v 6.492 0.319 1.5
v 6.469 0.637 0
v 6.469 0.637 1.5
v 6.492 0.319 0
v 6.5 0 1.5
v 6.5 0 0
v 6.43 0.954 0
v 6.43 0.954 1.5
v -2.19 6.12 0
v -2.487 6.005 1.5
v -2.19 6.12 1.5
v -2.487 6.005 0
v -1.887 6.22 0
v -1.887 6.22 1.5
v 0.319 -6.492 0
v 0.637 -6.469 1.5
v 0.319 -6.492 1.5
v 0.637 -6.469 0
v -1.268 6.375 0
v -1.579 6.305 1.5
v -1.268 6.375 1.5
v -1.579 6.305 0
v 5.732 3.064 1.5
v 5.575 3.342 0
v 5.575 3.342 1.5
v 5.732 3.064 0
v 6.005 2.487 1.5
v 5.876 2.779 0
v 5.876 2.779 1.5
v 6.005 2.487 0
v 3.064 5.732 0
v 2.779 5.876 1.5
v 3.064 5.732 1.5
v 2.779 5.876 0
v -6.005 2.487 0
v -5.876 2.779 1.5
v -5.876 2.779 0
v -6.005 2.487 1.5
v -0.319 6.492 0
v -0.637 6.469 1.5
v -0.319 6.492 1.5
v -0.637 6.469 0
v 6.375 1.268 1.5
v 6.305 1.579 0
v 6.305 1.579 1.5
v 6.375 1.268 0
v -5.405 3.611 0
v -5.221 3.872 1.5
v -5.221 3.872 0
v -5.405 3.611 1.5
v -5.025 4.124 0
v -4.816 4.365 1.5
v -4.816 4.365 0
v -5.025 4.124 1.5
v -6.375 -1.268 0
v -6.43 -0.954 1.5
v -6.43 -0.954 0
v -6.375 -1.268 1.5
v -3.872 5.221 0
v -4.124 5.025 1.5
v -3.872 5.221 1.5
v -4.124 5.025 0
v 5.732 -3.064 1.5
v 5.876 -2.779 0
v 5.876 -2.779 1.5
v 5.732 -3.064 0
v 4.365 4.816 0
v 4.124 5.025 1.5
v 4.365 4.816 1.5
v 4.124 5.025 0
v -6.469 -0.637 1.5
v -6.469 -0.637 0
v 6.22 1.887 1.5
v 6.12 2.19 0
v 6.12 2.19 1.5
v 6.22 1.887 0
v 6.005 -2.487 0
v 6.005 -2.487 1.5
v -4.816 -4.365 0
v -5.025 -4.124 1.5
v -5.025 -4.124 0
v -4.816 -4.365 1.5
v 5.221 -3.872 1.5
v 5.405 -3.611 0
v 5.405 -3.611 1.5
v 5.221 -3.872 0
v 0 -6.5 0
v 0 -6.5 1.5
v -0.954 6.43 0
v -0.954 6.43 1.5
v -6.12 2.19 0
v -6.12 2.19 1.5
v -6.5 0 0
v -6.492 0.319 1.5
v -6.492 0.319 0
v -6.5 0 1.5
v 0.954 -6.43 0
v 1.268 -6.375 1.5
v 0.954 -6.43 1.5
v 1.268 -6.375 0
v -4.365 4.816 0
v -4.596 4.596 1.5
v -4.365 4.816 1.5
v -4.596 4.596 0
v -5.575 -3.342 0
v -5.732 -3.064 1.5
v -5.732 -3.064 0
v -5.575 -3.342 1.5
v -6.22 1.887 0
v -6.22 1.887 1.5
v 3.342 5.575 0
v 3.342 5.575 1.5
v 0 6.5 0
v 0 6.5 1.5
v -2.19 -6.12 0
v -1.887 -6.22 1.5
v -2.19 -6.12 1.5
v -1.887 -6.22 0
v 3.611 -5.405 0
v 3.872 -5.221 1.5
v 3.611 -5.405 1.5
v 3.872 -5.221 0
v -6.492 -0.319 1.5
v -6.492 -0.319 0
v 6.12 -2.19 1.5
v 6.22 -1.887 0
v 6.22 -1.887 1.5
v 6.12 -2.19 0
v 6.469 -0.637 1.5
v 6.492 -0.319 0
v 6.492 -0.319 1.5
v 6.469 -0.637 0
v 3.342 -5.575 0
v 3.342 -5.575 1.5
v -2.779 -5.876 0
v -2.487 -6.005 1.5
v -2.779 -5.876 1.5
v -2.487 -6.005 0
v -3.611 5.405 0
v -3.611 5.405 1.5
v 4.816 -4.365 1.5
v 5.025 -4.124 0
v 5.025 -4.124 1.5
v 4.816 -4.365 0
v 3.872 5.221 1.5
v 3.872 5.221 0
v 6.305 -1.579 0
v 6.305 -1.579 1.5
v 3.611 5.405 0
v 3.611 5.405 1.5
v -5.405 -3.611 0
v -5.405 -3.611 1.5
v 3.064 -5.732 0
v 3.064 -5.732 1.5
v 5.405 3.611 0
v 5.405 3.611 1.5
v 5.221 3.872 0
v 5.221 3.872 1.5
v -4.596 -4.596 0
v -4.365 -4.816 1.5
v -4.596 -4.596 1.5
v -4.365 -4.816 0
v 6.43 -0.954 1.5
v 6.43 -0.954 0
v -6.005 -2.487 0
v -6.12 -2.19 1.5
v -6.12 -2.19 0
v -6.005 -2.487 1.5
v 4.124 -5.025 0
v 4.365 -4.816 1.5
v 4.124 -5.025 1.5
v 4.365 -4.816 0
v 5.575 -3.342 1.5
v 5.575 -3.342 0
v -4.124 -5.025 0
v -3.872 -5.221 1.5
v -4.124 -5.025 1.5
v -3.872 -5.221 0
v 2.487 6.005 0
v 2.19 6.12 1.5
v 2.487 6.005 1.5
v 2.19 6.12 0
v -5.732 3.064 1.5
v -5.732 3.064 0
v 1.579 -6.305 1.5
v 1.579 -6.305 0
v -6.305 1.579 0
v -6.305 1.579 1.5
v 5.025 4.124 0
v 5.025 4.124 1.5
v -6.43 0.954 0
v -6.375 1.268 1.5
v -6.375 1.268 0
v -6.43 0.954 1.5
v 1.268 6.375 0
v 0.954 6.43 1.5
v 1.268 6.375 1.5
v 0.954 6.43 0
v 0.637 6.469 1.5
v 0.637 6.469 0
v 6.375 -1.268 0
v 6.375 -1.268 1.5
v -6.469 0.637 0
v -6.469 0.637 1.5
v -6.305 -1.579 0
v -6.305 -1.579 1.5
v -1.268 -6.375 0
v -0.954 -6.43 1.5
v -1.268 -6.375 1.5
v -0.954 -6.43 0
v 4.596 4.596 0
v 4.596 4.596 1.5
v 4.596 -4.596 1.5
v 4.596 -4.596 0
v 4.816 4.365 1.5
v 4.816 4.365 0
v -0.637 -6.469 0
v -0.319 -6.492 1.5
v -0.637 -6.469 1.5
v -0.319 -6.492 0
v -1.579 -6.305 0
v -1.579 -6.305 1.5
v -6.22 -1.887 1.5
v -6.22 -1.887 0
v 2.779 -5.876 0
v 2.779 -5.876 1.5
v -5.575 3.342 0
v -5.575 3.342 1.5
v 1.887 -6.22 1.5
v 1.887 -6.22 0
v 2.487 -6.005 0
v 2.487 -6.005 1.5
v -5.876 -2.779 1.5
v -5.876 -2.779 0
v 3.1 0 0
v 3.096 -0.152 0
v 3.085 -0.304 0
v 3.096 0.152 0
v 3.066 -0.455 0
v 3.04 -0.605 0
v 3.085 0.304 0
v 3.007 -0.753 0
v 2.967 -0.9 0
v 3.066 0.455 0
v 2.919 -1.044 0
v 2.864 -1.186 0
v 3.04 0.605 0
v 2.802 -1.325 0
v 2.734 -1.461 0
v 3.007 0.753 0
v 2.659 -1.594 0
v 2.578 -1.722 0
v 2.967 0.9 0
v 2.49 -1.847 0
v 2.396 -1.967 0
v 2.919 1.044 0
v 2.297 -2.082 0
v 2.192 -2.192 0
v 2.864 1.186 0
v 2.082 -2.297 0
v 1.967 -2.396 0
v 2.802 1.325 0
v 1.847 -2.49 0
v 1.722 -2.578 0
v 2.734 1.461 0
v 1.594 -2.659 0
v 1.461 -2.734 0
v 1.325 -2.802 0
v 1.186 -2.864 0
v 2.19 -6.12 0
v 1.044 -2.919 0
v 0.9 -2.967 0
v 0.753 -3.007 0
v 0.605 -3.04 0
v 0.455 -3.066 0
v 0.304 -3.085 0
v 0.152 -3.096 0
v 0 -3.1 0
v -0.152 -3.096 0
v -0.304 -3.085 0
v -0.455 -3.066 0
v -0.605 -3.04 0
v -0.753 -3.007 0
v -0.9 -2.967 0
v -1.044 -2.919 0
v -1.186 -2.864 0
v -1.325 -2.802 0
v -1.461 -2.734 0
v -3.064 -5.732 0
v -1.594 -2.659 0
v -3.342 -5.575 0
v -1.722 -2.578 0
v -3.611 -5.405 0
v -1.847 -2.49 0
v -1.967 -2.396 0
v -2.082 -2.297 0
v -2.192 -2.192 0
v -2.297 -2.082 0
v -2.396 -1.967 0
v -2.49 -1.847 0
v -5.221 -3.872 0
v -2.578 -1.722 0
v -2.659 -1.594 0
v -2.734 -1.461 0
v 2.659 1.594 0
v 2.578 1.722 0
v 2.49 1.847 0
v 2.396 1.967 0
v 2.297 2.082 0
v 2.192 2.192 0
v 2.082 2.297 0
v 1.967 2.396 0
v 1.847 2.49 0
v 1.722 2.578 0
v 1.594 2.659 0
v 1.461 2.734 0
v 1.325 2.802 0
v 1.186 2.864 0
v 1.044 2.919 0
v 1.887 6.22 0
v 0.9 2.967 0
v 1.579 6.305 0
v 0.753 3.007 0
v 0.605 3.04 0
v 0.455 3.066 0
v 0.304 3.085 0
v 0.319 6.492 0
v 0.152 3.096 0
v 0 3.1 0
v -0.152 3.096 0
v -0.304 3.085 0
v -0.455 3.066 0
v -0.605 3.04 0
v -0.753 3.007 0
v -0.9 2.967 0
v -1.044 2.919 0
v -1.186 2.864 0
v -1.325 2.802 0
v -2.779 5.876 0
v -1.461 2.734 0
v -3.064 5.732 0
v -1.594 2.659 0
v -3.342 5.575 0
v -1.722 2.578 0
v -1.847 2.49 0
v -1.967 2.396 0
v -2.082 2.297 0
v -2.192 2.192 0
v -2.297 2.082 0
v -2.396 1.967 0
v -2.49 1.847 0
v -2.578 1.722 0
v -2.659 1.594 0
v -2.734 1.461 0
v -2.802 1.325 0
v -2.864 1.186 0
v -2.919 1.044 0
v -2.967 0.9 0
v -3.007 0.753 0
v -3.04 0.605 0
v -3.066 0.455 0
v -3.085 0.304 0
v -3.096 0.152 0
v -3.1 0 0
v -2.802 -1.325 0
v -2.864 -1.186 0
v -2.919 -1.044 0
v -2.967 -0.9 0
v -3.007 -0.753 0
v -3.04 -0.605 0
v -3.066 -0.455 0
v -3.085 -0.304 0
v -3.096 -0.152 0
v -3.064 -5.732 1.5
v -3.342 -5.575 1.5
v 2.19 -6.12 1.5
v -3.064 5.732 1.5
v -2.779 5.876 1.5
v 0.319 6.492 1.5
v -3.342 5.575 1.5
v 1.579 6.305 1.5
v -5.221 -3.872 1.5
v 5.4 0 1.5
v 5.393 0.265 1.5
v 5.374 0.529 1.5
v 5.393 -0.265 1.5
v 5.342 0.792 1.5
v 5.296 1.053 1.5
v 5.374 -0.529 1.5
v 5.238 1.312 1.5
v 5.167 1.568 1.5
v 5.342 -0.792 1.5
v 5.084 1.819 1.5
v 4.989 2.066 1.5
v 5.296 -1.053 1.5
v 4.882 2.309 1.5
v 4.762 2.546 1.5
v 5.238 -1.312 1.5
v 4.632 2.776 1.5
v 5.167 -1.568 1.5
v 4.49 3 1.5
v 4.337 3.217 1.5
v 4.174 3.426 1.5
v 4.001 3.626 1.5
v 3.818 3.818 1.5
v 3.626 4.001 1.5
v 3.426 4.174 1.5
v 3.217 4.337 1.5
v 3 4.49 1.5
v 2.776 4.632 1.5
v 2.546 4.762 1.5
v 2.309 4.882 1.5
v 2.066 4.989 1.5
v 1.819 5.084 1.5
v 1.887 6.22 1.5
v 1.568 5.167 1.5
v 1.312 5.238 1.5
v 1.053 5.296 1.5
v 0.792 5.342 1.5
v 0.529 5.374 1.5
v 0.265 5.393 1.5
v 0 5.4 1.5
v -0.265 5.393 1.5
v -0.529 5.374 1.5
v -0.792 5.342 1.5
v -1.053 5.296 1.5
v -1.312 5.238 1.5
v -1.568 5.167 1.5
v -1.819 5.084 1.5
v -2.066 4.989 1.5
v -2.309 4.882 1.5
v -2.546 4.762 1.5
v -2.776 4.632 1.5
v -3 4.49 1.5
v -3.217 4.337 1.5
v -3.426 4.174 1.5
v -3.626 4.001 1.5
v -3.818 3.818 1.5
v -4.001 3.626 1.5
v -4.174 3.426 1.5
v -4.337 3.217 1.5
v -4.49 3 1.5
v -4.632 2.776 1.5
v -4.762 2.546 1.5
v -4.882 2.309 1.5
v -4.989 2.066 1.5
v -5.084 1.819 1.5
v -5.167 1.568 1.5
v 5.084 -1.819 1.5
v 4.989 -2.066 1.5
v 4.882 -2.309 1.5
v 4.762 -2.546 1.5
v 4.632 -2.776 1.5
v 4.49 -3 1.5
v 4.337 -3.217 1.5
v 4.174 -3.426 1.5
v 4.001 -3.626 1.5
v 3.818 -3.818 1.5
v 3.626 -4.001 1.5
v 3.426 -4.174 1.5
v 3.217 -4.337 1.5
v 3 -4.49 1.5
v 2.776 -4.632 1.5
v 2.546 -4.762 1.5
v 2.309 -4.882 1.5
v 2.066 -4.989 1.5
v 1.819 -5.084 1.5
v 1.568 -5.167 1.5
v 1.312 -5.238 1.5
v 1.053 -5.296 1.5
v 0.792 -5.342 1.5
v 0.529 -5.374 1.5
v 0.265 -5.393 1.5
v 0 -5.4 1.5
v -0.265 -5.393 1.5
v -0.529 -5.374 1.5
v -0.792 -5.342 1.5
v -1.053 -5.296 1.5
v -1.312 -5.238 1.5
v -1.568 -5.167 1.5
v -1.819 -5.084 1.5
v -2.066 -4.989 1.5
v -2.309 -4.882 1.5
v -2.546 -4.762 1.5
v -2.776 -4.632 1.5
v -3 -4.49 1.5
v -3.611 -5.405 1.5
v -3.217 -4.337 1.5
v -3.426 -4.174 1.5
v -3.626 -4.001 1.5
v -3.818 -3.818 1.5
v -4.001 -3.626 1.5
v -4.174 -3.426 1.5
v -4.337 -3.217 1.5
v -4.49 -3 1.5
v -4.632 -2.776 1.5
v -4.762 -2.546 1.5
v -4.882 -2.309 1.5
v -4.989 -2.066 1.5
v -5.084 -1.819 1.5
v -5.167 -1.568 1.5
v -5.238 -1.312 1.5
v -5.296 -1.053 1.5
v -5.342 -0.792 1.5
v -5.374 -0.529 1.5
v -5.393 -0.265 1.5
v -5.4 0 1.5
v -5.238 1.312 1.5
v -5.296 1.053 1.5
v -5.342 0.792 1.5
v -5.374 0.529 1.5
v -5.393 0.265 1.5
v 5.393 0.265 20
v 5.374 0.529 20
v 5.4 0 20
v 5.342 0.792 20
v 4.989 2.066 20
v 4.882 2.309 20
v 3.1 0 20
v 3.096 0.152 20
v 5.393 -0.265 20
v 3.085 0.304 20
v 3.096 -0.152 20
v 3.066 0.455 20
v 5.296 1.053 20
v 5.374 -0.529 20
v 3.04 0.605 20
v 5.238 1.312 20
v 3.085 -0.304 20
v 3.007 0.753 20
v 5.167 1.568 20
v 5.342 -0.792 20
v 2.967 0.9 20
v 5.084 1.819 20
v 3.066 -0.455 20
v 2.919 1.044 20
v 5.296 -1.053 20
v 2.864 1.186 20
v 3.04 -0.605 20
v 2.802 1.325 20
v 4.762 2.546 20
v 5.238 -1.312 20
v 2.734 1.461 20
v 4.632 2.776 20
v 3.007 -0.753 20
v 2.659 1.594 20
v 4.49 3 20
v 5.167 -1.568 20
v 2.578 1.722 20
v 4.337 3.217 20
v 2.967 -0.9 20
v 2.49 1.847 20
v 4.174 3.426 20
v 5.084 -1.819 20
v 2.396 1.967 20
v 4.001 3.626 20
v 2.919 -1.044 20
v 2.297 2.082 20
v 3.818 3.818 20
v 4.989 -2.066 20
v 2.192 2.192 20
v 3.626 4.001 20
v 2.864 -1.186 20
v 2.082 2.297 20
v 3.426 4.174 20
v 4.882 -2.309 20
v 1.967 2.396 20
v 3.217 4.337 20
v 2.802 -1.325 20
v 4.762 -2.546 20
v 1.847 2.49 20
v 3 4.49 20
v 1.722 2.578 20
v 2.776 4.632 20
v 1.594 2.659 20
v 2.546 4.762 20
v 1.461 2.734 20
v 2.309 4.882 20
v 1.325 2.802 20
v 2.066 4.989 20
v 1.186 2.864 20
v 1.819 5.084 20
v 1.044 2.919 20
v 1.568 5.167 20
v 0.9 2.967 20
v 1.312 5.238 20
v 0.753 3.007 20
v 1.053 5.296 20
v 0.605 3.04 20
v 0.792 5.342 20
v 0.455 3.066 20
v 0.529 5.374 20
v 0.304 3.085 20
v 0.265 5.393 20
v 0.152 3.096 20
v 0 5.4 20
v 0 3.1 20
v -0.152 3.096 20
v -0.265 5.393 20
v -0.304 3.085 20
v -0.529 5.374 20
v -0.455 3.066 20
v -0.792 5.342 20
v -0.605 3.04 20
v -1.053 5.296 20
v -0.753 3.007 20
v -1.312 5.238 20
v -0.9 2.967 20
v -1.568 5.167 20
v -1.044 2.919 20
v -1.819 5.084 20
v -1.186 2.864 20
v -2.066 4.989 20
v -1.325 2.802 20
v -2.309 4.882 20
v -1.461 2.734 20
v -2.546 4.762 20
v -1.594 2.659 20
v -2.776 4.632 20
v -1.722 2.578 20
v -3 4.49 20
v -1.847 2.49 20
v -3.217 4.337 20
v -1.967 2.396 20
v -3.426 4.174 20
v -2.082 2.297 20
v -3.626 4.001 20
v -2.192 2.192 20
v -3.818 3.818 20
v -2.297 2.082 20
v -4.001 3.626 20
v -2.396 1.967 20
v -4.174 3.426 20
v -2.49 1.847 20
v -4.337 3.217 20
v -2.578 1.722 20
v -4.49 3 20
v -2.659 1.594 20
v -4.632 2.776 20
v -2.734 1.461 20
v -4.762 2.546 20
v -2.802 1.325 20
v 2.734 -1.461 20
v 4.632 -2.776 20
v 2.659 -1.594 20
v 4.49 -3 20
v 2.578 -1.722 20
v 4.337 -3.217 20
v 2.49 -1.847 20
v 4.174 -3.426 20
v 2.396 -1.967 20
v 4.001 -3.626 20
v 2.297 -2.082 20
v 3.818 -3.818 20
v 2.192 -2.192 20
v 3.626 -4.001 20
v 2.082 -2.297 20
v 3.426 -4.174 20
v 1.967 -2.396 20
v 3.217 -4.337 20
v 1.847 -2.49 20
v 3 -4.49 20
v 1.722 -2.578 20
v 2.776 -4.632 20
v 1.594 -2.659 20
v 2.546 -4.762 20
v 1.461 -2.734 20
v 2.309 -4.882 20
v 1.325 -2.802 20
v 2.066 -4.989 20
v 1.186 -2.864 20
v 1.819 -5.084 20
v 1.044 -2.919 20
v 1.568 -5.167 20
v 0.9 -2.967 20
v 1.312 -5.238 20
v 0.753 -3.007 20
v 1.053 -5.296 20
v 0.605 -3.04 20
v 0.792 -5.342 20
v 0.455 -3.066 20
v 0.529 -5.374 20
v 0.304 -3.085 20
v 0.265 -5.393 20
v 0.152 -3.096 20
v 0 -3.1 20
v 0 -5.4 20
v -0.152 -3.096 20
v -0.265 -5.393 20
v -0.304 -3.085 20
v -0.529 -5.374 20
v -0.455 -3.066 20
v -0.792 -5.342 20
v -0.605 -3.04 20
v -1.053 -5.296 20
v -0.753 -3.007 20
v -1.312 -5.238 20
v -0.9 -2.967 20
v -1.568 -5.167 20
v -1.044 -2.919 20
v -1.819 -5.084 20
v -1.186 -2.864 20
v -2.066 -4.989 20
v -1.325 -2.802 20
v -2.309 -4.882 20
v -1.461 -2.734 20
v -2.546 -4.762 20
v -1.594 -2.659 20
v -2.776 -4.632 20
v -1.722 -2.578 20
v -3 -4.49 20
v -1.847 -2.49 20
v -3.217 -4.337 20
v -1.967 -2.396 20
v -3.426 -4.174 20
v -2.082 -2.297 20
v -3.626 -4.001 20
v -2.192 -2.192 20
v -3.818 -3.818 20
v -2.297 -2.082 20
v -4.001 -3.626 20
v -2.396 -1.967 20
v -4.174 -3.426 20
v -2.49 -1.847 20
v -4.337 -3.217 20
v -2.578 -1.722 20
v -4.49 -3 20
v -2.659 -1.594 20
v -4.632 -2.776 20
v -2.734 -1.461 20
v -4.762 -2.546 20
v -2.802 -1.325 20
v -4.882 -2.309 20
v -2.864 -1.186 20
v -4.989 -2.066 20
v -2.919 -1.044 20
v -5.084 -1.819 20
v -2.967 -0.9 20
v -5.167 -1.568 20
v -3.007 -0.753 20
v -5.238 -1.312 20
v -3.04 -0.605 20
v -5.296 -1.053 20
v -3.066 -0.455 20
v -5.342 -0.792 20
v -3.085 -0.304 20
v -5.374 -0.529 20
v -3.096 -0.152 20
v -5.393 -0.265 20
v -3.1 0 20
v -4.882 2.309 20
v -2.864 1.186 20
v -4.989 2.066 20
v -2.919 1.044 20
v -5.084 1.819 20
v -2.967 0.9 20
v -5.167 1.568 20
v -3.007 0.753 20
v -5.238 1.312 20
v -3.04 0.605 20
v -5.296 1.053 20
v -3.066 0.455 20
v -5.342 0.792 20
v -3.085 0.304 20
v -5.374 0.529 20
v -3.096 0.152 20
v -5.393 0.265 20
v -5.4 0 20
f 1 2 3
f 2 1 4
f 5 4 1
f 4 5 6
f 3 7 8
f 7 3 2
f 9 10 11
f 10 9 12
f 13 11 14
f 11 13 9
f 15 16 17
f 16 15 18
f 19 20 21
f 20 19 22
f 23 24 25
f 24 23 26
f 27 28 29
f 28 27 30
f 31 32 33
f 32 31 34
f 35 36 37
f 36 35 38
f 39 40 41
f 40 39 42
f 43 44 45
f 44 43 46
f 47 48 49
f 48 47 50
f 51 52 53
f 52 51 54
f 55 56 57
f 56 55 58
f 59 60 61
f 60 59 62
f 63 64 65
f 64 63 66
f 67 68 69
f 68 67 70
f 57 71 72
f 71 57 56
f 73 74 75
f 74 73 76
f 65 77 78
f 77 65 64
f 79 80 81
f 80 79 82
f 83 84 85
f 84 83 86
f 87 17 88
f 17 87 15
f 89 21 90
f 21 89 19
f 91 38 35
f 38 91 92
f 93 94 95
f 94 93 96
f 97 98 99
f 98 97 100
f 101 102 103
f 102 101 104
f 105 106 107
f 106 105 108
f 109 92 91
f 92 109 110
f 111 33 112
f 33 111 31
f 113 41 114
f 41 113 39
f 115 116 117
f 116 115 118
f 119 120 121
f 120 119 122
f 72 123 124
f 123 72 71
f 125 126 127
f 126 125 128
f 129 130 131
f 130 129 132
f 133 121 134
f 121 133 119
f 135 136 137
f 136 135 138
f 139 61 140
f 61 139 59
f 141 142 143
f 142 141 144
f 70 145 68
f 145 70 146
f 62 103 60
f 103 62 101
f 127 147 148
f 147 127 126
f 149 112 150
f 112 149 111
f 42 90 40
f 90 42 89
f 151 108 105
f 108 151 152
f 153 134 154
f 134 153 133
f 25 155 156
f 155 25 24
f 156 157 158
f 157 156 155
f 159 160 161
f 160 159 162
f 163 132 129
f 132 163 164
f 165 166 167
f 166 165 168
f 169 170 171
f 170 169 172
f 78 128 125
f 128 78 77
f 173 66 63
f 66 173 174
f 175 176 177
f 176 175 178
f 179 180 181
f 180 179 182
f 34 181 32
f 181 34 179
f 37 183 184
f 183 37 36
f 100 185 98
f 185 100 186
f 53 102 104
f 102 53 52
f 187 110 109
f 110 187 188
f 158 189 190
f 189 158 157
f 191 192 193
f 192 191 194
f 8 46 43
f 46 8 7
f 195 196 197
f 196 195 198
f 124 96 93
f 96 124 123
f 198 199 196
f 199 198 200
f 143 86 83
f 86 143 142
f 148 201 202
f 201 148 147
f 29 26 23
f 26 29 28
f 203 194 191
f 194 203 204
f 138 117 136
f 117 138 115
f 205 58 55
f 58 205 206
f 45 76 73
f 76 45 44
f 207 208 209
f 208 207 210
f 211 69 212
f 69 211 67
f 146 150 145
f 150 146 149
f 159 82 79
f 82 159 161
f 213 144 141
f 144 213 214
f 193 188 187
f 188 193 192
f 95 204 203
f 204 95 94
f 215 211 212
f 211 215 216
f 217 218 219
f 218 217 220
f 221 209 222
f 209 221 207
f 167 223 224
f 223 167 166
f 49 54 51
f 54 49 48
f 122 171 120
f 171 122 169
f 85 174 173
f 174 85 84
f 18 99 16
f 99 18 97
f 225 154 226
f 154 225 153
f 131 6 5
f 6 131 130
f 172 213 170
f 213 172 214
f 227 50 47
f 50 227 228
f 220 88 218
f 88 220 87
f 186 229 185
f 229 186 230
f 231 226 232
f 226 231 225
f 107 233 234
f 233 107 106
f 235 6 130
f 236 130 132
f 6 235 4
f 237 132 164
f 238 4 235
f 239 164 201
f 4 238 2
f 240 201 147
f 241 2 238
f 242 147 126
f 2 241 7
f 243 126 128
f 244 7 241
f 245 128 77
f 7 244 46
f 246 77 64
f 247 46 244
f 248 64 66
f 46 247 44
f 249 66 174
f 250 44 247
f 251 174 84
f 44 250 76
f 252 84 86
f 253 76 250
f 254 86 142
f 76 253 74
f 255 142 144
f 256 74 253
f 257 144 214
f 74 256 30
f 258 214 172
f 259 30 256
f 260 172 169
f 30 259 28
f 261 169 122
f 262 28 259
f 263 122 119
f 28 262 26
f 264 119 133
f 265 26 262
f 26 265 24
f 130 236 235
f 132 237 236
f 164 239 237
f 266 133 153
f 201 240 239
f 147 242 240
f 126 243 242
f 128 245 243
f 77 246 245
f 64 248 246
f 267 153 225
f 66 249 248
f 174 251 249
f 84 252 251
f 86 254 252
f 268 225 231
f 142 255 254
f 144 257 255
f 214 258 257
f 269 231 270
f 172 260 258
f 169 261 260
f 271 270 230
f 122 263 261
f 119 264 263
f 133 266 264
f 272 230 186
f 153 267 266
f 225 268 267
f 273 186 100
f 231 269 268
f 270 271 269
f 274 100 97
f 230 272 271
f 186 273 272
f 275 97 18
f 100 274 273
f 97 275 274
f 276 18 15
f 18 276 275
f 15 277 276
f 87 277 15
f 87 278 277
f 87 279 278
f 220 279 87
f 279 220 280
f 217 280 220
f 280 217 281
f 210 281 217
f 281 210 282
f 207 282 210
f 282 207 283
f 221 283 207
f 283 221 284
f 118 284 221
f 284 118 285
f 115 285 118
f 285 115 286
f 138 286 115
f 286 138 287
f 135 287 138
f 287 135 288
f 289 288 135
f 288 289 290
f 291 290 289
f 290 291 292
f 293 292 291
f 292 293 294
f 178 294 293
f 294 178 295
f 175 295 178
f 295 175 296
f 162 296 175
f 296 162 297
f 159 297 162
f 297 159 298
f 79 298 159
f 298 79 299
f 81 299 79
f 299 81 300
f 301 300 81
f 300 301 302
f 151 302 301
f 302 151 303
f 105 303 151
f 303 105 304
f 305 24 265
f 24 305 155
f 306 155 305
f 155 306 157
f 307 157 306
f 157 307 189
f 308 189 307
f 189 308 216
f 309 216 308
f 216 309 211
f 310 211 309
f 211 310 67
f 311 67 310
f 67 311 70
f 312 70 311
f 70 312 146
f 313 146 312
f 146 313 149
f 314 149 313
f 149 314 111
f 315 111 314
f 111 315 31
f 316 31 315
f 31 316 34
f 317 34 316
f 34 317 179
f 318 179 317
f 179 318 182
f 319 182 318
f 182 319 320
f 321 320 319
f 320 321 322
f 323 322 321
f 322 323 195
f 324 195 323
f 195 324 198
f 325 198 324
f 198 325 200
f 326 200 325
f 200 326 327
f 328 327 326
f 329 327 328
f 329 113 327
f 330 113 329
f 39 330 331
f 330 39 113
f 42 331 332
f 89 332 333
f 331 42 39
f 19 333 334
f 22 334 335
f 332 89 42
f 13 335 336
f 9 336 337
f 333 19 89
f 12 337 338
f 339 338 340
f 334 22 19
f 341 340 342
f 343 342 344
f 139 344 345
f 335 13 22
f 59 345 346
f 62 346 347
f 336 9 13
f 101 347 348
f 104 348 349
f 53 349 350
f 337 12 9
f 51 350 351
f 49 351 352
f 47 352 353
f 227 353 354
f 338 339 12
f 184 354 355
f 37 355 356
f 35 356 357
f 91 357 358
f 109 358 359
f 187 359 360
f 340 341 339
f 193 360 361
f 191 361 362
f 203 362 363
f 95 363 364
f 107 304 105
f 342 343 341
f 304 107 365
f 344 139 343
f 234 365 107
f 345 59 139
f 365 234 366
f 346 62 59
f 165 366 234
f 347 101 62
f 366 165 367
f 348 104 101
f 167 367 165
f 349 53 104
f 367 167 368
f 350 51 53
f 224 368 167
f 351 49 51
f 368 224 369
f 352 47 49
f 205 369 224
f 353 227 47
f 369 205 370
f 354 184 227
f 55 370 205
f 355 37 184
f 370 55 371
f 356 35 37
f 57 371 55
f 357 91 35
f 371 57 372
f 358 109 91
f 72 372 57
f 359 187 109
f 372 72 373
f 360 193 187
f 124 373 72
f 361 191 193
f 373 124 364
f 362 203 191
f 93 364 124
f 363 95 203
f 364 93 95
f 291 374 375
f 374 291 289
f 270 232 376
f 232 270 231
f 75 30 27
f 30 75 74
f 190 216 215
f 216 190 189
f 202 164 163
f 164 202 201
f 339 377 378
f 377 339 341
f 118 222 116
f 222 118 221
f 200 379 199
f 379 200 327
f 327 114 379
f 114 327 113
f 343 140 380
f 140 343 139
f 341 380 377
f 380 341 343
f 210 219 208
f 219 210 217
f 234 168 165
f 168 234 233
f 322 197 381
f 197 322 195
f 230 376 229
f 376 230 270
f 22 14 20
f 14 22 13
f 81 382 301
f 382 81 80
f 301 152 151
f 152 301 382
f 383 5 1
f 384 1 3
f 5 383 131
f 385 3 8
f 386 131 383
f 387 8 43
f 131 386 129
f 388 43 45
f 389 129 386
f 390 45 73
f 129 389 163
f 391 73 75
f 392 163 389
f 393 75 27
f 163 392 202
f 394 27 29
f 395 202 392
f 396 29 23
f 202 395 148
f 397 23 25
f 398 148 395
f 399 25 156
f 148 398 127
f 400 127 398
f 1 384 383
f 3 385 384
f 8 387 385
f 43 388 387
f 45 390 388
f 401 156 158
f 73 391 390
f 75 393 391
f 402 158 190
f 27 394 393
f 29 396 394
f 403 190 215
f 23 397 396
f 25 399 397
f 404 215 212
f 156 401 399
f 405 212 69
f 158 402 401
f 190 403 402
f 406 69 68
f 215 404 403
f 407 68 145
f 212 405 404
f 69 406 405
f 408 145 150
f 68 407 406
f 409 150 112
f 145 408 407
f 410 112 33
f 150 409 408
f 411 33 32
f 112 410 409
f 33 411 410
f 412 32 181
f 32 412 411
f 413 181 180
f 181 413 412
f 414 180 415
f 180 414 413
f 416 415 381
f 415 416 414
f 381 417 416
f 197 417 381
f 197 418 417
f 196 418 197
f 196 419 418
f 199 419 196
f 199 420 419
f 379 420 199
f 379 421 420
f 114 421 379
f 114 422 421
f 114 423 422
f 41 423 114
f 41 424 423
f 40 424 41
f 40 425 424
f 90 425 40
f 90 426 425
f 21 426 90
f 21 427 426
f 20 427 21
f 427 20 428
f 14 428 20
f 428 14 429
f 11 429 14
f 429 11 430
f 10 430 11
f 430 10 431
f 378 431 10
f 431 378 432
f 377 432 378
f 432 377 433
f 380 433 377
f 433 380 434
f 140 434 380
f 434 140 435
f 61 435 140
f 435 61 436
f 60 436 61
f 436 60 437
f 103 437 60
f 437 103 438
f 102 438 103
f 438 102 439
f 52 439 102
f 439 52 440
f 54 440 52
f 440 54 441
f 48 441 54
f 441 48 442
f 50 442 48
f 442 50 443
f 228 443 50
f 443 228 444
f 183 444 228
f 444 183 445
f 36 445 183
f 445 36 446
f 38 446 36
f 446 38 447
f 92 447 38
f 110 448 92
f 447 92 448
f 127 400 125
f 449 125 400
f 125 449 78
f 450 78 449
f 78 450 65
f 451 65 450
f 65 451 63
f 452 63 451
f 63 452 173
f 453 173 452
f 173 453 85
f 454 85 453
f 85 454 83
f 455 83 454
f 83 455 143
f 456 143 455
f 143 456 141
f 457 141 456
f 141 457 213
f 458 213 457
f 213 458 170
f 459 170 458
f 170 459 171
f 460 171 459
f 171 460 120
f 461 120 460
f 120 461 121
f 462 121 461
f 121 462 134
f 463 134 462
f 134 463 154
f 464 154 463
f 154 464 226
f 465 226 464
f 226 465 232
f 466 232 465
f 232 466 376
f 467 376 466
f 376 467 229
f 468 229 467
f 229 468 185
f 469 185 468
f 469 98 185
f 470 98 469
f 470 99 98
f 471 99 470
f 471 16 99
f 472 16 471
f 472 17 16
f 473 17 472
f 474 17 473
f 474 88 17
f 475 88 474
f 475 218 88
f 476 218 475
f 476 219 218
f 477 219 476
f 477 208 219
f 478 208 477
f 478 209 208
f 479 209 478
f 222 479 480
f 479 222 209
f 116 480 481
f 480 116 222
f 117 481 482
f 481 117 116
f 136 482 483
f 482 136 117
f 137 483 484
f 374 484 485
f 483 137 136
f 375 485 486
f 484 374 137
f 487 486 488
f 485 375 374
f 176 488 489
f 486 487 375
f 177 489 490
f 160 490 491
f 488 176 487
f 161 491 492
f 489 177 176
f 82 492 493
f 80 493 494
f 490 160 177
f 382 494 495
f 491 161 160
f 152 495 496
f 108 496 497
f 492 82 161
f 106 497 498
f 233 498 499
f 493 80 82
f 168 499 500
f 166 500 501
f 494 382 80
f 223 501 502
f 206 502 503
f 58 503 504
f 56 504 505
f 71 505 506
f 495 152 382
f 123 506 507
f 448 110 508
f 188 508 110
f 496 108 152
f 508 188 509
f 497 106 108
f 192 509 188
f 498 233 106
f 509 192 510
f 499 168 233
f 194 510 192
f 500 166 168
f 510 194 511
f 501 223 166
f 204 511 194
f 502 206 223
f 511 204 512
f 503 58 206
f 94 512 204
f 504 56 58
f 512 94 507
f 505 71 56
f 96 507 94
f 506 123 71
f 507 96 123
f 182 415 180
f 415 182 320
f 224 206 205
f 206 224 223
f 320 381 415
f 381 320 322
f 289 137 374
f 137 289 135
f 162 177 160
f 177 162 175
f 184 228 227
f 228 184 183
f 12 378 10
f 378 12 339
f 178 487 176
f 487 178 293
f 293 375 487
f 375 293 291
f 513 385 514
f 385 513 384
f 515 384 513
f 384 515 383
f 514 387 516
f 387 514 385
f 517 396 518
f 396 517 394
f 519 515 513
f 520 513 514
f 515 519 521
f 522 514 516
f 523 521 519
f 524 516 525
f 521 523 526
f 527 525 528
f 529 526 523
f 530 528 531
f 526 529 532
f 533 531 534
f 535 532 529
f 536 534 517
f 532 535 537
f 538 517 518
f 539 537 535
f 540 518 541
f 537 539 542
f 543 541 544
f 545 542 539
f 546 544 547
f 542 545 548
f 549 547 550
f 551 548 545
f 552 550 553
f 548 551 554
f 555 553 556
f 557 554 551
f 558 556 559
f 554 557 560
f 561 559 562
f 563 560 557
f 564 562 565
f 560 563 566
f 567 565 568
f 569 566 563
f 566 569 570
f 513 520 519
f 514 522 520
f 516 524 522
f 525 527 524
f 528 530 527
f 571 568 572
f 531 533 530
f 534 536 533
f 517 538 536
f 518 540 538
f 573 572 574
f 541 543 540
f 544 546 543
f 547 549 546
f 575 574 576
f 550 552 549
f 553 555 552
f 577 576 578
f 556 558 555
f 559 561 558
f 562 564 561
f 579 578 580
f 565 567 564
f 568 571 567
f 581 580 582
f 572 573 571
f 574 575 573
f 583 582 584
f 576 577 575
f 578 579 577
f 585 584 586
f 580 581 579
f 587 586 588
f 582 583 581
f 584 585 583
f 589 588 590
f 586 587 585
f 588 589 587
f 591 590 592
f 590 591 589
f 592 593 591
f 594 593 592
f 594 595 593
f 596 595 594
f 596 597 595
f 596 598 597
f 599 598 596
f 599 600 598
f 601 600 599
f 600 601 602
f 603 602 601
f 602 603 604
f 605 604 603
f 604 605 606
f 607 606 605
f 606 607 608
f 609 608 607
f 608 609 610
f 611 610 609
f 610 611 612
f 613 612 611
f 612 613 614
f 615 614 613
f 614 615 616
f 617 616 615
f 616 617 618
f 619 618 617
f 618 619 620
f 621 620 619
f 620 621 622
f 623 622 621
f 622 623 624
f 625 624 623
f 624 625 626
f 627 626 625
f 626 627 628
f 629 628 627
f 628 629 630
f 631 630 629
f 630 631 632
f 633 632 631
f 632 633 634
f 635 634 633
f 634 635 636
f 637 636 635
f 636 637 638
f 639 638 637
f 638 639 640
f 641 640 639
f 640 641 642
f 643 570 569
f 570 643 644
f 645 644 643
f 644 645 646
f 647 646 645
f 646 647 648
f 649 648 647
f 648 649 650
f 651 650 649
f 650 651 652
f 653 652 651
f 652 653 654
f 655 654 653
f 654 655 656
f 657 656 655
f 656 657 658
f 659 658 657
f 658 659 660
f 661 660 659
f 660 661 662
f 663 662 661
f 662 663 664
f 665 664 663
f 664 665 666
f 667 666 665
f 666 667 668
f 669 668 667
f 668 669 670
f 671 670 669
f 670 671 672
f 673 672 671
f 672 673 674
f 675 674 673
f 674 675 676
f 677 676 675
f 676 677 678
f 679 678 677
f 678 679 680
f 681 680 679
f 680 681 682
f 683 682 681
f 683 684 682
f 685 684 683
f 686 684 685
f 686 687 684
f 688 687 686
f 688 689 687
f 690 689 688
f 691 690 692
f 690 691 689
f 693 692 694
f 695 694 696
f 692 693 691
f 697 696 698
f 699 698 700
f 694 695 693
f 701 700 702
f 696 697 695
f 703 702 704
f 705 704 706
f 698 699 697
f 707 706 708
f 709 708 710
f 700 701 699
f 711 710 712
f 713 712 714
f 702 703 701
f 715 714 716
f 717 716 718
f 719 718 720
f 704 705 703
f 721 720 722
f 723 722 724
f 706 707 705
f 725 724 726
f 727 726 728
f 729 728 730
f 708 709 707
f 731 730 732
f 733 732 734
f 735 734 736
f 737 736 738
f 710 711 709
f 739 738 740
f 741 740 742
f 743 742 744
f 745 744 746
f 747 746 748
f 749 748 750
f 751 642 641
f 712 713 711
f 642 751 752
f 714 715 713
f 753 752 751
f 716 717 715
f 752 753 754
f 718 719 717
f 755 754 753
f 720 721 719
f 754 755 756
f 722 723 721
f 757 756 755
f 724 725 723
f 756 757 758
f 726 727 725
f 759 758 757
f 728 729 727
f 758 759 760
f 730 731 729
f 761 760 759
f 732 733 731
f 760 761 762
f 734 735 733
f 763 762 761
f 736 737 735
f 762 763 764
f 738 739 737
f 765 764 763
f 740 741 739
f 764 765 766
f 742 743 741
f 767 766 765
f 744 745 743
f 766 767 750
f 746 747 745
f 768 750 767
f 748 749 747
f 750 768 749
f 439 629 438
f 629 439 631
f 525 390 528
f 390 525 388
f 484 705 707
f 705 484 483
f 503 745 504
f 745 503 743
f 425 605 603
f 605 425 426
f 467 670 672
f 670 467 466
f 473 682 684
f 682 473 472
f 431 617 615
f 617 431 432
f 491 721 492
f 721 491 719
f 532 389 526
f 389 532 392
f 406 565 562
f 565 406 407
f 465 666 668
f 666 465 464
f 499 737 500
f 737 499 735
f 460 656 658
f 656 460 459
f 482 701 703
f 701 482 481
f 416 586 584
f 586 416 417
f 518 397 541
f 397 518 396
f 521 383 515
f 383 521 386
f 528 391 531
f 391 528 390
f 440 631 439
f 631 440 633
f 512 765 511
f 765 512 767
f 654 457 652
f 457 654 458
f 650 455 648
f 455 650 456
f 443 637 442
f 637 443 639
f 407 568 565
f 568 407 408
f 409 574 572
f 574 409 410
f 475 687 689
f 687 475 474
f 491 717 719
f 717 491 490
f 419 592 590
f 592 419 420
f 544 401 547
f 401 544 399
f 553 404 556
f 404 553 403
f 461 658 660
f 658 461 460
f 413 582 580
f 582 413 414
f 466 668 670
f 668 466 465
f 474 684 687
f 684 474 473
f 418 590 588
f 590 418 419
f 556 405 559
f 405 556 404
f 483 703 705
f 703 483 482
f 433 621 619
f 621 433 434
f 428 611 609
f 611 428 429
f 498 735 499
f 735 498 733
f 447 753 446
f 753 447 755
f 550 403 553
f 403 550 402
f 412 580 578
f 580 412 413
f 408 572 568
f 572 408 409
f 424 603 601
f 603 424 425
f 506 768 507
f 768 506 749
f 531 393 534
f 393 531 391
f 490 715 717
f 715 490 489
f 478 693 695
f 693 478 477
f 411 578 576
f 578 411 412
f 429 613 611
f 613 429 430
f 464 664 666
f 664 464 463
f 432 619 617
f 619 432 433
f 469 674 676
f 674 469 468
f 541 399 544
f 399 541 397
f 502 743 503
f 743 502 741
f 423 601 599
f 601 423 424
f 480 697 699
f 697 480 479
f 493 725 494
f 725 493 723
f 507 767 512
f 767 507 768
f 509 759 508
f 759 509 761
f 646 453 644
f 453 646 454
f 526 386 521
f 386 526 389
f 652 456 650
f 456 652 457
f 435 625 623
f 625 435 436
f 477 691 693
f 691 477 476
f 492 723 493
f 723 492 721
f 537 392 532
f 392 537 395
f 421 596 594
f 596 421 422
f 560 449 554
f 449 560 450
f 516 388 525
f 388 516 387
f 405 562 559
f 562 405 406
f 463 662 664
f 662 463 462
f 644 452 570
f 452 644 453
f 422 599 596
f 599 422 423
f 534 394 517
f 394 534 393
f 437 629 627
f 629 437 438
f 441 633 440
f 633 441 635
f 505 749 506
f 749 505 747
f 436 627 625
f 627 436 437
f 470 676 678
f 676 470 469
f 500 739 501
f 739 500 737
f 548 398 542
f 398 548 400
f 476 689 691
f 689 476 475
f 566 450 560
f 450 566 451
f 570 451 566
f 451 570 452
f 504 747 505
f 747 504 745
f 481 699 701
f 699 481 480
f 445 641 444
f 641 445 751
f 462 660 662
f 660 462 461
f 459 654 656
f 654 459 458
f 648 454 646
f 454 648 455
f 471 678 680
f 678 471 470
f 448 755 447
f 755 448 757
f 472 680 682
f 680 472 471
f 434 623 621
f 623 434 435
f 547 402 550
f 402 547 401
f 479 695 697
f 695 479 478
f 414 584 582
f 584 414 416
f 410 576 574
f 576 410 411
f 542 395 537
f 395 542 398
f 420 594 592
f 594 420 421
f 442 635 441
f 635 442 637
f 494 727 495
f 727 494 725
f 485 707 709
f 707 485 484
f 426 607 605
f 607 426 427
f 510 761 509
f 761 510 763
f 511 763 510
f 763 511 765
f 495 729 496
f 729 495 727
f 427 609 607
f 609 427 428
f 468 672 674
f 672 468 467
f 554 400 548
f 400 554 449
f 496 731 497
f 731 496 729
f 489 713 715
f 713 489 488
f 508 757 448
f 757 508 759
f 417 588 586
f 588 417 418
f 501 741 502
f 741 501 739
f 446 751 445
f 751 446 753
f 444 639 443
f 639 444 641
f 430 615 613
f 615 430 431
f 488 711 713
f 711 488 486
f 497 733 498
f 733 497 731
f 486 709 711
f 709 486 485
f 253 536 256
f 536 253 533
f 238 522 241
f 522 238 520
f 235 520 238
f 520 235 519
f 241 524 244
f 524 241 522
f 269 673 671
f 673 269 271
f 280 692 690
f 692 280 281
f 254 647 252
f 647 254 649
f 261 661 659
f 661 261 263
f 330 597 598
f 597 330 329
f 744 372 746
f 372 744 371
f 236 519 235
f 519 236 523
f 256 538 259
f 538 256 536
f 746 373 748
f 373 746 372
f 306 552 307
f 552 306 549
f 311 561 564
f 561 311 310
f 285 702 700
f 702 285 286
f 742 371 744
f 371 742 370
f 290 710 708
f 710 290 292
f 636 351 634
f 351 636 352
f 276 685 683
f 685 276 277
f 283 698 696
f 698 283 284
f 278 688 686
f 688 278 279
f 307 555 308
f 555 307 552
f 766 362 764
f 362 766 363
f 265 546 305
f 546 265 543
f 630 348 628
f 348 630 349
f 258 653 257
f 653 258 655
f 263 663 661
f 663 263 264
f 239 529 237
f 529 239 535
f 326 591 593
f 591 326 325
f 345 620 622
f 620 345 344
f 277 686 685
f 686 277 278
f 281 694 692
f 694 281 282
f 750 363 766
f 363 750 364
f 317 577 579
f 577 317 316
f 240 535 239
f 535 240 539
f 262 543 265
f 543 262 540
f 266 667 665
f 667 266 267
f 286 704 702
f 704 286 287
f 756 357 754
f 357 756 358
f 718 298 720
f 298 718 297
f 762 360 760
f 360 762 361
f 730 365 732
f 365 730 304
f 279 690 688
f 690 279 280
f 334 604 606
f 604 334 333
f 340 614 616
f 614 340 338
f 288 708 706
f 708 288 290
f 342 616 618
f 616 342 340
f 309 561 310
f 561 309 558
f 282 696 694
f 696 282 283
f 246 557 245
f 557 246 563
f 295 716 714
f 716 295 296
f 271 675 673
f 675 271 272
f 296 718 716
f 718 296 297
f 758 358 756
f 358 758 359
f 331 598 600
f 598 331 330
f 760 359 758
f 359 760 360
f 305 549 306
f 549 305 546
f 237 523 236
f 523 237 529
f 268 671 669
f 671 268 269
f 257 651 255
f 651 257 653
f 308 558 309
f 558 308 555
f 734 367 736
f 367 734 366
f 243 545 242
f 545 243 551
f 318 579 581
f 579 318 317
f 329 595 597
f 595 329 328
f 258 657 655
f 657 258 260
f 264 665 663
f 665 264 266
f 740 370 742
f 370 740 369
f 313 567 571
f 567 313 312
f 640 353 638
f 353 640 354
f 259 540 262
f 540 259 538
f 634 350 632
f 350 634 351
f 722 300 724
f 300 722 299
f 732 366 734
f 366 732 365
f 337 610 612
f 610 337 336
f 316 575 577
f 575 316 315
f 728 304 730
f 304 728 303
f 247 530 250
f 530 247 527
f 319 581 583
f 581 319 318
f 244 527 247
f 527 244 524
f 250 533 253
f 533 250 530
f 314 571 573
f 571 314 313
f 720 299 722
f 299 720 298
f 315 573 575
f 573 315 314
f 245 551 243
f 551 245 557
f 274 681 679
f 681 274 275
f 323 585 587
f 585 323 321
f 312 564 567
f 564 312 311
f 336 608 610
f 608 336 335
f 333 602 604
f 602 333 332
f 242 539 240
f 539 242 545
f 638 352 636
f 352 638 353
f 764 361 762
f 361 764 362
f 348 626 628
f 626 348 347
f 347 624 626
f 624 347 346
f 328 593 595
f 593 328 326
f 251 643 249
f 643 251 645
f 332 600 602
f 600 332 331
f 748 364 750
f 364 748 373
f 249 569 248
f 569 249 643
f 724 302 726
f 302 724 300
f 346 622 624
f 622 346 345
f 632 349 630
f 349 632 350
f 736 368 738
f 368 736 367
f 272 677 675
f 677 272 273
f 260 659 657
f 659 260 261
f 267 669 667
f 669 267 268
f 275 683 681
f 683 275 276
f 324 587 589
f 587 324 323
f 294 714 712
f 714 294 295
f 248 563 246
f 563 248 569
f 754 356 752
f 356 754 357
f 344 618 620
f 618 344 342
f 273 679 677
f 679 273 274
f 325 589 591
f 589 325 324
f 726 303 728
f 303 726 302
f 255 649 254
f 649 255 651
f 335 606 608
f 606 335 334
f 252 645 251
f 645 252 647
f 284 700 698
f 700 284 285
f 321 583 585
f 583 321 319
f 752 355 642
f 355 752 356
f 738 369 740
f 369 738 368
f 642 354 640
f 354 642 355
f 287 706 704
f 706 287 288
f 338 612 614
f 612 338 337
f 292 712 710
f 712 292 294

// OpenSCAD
// Adapter Sleeve for 0.2mL PCR tube in 1.5mL rack
// Print orientation: Upside down (Collar on bed)
// Units: mm

// Dimensions
$fn = 128; // High resolution for smooth curves

// Collar (Base)
$collar_outer_d = 13;
$collar_thickness = 1.5;

// Sleeve Body
$sleeve_outer_d = 10.8;
$sleeve_total_height = 21.5;
$sleeve_inner_d = 6.2;

// Derived heights
$collar_z_top = $collar_thickness;
$sleeve_body_height = $sleeve_total_height - $collar_thickness;

// Build the part
difference() {
    // 1. Outer Shell
    union() {
        // Collar (Disk)
        cylinder(
            h = $collar_thickness,
            d = $collar_outer_d,
            center = [0, 0, $collar_thickness/2]
        );
        
        // Sleeve Body (Cylinder)
        cylinder(
            h = $sleeve_body_height,
            d = $sleeve_outer_d,
            center = [0, 0, $collar_thickness + $sleeve_body_height/2]
        );
    }
    
    // 2. Inner Bore (Hole)
    // Extends slightly past the top and bottom faces to ensure clean cut
    cylinder(
        h = $sleeve_total_height + 0.1,
        d = $sleeve_inner_d,
        center = [0, 0, $collar_thickness/2 + $sleeve_body_height/2]
    );
}
